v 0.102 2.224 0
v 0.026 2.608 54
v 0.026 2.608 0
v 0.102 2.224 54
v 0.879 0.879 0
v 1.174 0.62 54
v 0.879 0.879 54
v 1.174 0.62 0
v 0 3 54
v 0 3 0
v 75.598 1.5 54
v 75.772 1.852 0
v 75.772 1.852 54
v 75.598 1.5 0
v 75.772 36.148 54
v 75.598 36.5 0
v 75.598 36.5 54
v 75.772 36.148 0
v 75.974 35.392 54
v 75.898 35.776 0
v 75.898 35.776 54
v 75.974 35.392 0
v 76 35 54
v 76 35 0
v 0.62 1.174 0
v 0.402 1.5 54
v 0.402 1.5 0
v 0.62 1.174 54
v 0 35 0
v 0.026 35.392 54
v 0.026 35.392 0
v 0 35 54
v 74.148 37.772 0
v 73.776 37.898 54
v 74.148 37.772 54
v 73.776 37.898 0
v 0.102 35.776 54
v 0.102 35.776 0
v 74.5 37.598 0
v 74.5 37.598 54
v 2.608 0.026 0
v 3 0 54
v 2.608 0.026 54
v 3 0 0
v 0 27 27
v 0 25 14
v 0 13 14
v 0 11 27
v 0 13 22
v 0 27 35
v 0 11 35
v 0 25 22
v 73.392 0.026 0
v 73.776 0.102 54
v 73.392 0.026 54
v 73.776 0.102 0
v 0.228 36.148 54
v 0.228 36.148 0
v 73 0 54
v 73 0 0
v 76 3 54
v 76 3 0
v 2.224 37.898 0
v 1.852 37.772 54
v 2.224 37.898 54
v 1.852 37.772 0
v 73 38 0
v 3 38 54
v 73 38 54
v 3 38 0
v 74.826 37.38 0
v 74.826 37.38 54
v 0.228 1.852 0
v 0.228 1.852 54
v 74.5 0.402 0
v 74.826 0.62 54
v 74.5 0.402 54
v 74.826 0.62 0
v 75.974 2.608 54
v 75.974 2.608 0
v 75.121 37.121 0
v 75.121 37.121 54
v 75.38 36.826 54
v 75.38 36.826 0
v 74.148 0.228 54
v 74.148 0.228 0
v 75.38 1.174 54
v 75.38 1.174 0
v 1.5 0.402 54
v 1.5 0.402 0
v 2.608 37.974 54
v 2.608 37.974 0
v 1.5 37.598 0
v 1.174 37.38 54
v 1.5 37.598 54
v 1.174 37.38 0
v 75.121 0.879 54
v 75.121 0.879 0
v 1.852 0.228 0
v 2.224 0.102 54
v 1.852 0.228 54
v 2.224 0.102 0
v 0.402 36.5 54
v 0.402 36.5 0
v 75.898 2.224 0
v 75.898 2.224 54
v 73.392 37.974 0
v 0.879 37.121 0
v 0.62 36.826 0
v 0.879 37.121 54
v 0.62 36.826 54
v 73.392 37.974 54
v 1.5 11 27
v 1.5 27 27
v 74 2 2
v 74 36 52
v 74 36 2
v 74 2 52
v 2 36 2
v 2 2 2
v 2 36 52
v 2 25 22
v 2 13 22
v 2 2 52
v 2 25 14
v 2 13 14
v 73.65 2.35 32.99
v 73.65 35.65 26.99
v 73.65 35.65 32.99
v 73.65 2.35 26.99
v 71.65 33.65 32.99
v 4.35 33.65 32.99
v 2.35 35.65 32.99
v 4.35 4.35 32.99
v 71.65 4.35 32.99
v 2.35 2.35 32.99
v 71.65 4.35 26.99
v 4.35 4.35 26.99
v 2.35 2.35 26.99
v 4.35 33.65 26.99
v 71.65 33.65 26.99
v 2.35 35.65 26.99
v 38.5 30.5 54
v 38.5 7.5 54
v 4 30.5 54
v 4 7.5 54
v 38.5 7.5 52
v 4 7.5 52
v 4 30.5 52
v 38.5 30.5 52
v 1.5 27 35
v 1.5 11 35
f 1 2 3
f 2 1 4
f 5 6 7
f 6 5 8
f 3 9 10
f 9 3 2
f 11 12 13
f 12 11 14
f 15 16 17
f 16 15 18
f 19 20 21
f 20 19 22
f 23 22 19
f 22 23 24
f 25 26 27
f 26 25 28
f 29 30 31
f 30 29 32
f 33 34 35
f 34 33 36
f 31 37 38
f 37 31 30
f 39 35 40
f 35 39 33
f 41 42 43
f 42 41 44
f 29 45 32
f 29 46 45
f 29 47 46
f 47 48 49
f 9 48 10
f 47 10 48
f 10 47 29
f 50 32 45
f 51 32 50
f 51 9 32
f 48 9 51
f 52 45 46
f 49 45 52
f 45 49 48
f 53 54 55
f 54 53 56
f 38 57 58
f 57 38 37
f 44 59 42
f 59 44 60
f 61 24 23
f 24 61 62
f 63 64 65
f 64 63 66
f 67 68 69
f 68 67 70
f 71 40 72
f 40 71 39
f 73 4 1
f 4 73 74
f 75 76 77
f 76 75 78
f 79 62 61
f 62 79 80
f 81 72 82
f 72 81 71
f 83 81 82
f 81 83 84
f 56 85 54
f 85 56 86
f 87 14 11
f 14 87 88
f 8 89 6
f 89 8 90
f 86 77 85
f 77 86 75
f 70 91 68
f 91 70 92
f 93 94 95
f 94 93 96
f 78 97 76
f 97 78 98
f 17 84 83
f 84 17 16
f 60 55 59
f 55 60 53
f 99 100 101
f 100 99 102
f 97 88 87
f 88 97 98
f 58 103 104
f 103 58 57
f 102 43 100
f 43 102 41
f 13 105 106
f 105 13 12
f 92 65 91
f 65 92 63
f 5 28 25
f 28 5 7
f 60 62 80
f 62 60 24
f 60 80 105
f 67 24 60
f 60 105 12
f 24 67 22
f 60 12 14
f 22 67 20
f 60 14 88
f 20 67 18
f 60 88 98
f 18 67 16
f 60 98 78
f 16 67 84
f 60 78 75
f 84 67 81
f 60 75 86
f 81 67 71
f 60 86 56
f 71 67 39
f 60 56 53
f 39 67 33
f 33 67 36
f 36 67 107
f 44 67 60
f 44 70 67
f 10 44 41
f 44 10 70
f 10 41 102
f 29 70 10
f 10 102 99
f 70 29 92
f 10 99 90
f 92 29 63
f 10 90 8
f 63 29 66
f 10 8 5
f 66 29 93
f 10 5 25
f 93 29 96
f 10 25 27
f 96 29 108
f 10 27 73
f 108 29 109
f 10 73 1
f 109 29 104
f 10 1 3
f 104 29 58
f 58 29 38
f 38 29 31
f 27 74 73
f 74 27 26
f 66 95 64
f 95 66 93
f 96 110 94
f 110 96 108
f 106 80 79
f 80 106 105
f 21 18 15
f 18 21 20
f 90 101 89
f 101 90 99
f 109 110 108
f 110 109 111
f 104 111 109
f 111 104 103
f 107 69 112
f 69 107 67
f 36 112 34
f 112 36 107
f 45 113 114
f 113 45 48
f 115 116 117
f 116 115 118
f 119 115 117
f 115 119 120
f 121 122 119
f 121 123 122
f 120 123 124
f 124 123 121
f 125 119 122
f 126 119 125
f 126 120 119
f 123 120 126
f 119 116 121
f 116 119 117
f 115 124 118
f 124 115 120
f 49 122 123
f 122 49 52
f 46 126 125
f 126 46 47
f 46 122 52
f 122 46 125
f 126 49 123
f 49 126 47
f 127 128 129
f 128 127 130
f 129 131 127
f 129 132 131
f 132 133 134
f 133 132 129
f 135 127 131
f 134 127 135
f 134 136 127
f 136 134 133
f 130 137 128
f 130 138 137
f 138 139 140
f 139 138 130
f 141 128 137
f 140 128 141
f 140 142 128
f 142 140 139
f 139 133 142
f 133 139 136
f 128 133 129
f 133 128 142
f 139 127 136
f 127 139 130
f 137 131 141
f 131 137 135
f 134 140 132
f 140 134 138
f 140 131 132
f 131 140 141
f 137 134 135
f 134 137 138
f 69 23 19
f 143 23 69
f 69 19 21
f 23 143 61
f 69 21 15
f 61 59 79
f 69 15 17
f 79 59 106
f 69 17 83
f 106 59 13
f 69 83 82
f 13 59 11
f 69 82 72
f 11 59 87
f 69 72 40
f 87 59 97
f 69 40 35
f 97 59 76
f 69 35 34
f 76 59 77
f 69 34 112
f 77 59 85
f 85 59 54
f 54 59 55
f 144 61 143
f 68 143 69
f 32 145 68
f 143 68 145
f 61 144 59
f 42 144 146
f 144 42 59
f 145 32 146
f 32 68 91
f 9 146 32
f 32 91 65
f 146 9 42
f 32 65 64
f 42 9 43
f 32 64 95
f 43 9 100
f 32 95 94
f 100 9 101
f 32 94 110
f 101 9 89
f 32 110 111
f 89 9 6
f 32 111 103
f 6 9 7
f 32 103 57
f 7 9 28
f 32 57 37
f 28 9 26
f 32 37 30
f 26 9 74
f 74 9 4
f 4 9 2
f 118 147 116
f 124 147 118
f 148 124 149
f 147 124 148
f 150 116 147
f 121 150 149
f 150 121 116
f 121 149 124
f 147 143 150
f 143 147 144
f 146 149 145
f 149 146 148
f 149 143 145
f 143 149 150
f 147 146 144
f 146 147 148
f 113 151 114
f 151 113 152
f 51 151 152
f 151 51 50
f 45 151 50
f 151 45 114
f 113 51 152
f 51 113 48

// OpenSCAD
$fn = 48;

part = "assembly"; // base, lid, assembly

internal_length = 72;
internal_width = 34;
internal_height = 50;

wall = 2;
floor_thickness = 2;
top_thickness = 2;
outer_corner_radius = 3;
lip_height = 6;
lip_wall = 2;
lip_clearance = 0.35;
lid_thumb_notch_width = 16;
lid_thumb_notch_depth = 1.4;
lid_thumb_notch_height = 8;

base_internal_height = 25;
lid_internal_height = internal_height - base_internal_height;

outer_length = internal_length + wall * 2;
outer_width = internal_width + wall * 2;
base_outer_height = base_internal_height + floor_thickness;
lid_outer_height = lid_internal_height + top_thickness;
total_outer_height = base_outer_height + lid_outer_height;

screen_open_width = 23;
screen_open_length = 34.5;
screen_front_offset = 4;

usb_cutout_width = 12;
usb_cutout_height = 8;
usb_cutout_center_height = total_outer_height / 3;
usb_cutout_y = (outer_width - usb_cutout_width) / 2;
usb_cutout_z = usb_cutout_center_height - usb_cutout_height / 2;

lip_outer_length = internal_length - lip_clearance * 2;
lip_outer_width = internal_width - lip_clearance * 2;
lip_inner_length = lip_outer_length - lip_wall * 2;
lip_inner_width = lip_outer_width - lip_wall * 2;

module rounded_prism(length, width, height, radius) {
    linear_extrude(height = height)
        hull() {
            translate([radius, radius]) circle(r = radius);
            translate([length - radius, radius]) circle(r = radius);
            translate([radius, width - radius]) circle(r = radius);
            translate([length - radius, width - radius]) circle(r = radius);
        }
}

module base_shell() {
    difference() {
        rounded_prism(outer_length, outer_width, base_outer_height, outer_corner_radius);
        translate([wall, wall, floor_thickness])
            cube([internal_length, internal_width, base_internal_height + 0.1]);
        translate([-0.1, usb_cutout_y, usb_cutout_z])
            cube([wall + 0.2, usb_cutout_width, usb_cutout_height]);
    }

    translate([(outer_length - lip_outer_length) / 2, (outer_width - lip_outer_width) / 2, base_outer_height - 0.01])
        difference() {
            cube([lip_outer_length, lip_outer_width, lip_height]);
            translate([(lip_outer_length - lip_inner_length) / 2, (lip_outer_width - lip_inner_width) / 2, -0.1])
                cube([lip_inner_length, lip_inner_width, lip_height + 0.2]);
        }
}

module lid_shell() {
    difference() {
        rounded_prism(outer_length, outer_width, lid_outer_height, outer_corner_radius);
        translate([wall, wall, -0.1])
            cube([internal_length, internal_width, lid_internal_height + 0.1]);
        translate([screen_front_offset, (outer_width - screen_open_width) / 2, lid_outer_height - top_thickness - 0.1])
            cube([screen_open_length, screen_open_width, top_thickness + 0.2]);
        translate([-0.1, (outer_width - lid_thumb_notch_width) / 2, 0])
            cube([lid_thumb_notch_depth + 0.2, lid_thumb_notch_width, lid_thumb_notch_height]);
    }
}

module assembly_view() {
    base_shell();
    translate([0, 0, base_outer_height])
        lid_shell();
}

module print_layout() {
    base_shell();
    translate([outer_length + 10, 0, 0])
        lid_shell();
}

if (part == "base") {
    base_shell();
} else if (part == "lid") {
    lid_shell();
} else if (part == "print") {
    print_layout();
} else {
    assembly_view();
}
